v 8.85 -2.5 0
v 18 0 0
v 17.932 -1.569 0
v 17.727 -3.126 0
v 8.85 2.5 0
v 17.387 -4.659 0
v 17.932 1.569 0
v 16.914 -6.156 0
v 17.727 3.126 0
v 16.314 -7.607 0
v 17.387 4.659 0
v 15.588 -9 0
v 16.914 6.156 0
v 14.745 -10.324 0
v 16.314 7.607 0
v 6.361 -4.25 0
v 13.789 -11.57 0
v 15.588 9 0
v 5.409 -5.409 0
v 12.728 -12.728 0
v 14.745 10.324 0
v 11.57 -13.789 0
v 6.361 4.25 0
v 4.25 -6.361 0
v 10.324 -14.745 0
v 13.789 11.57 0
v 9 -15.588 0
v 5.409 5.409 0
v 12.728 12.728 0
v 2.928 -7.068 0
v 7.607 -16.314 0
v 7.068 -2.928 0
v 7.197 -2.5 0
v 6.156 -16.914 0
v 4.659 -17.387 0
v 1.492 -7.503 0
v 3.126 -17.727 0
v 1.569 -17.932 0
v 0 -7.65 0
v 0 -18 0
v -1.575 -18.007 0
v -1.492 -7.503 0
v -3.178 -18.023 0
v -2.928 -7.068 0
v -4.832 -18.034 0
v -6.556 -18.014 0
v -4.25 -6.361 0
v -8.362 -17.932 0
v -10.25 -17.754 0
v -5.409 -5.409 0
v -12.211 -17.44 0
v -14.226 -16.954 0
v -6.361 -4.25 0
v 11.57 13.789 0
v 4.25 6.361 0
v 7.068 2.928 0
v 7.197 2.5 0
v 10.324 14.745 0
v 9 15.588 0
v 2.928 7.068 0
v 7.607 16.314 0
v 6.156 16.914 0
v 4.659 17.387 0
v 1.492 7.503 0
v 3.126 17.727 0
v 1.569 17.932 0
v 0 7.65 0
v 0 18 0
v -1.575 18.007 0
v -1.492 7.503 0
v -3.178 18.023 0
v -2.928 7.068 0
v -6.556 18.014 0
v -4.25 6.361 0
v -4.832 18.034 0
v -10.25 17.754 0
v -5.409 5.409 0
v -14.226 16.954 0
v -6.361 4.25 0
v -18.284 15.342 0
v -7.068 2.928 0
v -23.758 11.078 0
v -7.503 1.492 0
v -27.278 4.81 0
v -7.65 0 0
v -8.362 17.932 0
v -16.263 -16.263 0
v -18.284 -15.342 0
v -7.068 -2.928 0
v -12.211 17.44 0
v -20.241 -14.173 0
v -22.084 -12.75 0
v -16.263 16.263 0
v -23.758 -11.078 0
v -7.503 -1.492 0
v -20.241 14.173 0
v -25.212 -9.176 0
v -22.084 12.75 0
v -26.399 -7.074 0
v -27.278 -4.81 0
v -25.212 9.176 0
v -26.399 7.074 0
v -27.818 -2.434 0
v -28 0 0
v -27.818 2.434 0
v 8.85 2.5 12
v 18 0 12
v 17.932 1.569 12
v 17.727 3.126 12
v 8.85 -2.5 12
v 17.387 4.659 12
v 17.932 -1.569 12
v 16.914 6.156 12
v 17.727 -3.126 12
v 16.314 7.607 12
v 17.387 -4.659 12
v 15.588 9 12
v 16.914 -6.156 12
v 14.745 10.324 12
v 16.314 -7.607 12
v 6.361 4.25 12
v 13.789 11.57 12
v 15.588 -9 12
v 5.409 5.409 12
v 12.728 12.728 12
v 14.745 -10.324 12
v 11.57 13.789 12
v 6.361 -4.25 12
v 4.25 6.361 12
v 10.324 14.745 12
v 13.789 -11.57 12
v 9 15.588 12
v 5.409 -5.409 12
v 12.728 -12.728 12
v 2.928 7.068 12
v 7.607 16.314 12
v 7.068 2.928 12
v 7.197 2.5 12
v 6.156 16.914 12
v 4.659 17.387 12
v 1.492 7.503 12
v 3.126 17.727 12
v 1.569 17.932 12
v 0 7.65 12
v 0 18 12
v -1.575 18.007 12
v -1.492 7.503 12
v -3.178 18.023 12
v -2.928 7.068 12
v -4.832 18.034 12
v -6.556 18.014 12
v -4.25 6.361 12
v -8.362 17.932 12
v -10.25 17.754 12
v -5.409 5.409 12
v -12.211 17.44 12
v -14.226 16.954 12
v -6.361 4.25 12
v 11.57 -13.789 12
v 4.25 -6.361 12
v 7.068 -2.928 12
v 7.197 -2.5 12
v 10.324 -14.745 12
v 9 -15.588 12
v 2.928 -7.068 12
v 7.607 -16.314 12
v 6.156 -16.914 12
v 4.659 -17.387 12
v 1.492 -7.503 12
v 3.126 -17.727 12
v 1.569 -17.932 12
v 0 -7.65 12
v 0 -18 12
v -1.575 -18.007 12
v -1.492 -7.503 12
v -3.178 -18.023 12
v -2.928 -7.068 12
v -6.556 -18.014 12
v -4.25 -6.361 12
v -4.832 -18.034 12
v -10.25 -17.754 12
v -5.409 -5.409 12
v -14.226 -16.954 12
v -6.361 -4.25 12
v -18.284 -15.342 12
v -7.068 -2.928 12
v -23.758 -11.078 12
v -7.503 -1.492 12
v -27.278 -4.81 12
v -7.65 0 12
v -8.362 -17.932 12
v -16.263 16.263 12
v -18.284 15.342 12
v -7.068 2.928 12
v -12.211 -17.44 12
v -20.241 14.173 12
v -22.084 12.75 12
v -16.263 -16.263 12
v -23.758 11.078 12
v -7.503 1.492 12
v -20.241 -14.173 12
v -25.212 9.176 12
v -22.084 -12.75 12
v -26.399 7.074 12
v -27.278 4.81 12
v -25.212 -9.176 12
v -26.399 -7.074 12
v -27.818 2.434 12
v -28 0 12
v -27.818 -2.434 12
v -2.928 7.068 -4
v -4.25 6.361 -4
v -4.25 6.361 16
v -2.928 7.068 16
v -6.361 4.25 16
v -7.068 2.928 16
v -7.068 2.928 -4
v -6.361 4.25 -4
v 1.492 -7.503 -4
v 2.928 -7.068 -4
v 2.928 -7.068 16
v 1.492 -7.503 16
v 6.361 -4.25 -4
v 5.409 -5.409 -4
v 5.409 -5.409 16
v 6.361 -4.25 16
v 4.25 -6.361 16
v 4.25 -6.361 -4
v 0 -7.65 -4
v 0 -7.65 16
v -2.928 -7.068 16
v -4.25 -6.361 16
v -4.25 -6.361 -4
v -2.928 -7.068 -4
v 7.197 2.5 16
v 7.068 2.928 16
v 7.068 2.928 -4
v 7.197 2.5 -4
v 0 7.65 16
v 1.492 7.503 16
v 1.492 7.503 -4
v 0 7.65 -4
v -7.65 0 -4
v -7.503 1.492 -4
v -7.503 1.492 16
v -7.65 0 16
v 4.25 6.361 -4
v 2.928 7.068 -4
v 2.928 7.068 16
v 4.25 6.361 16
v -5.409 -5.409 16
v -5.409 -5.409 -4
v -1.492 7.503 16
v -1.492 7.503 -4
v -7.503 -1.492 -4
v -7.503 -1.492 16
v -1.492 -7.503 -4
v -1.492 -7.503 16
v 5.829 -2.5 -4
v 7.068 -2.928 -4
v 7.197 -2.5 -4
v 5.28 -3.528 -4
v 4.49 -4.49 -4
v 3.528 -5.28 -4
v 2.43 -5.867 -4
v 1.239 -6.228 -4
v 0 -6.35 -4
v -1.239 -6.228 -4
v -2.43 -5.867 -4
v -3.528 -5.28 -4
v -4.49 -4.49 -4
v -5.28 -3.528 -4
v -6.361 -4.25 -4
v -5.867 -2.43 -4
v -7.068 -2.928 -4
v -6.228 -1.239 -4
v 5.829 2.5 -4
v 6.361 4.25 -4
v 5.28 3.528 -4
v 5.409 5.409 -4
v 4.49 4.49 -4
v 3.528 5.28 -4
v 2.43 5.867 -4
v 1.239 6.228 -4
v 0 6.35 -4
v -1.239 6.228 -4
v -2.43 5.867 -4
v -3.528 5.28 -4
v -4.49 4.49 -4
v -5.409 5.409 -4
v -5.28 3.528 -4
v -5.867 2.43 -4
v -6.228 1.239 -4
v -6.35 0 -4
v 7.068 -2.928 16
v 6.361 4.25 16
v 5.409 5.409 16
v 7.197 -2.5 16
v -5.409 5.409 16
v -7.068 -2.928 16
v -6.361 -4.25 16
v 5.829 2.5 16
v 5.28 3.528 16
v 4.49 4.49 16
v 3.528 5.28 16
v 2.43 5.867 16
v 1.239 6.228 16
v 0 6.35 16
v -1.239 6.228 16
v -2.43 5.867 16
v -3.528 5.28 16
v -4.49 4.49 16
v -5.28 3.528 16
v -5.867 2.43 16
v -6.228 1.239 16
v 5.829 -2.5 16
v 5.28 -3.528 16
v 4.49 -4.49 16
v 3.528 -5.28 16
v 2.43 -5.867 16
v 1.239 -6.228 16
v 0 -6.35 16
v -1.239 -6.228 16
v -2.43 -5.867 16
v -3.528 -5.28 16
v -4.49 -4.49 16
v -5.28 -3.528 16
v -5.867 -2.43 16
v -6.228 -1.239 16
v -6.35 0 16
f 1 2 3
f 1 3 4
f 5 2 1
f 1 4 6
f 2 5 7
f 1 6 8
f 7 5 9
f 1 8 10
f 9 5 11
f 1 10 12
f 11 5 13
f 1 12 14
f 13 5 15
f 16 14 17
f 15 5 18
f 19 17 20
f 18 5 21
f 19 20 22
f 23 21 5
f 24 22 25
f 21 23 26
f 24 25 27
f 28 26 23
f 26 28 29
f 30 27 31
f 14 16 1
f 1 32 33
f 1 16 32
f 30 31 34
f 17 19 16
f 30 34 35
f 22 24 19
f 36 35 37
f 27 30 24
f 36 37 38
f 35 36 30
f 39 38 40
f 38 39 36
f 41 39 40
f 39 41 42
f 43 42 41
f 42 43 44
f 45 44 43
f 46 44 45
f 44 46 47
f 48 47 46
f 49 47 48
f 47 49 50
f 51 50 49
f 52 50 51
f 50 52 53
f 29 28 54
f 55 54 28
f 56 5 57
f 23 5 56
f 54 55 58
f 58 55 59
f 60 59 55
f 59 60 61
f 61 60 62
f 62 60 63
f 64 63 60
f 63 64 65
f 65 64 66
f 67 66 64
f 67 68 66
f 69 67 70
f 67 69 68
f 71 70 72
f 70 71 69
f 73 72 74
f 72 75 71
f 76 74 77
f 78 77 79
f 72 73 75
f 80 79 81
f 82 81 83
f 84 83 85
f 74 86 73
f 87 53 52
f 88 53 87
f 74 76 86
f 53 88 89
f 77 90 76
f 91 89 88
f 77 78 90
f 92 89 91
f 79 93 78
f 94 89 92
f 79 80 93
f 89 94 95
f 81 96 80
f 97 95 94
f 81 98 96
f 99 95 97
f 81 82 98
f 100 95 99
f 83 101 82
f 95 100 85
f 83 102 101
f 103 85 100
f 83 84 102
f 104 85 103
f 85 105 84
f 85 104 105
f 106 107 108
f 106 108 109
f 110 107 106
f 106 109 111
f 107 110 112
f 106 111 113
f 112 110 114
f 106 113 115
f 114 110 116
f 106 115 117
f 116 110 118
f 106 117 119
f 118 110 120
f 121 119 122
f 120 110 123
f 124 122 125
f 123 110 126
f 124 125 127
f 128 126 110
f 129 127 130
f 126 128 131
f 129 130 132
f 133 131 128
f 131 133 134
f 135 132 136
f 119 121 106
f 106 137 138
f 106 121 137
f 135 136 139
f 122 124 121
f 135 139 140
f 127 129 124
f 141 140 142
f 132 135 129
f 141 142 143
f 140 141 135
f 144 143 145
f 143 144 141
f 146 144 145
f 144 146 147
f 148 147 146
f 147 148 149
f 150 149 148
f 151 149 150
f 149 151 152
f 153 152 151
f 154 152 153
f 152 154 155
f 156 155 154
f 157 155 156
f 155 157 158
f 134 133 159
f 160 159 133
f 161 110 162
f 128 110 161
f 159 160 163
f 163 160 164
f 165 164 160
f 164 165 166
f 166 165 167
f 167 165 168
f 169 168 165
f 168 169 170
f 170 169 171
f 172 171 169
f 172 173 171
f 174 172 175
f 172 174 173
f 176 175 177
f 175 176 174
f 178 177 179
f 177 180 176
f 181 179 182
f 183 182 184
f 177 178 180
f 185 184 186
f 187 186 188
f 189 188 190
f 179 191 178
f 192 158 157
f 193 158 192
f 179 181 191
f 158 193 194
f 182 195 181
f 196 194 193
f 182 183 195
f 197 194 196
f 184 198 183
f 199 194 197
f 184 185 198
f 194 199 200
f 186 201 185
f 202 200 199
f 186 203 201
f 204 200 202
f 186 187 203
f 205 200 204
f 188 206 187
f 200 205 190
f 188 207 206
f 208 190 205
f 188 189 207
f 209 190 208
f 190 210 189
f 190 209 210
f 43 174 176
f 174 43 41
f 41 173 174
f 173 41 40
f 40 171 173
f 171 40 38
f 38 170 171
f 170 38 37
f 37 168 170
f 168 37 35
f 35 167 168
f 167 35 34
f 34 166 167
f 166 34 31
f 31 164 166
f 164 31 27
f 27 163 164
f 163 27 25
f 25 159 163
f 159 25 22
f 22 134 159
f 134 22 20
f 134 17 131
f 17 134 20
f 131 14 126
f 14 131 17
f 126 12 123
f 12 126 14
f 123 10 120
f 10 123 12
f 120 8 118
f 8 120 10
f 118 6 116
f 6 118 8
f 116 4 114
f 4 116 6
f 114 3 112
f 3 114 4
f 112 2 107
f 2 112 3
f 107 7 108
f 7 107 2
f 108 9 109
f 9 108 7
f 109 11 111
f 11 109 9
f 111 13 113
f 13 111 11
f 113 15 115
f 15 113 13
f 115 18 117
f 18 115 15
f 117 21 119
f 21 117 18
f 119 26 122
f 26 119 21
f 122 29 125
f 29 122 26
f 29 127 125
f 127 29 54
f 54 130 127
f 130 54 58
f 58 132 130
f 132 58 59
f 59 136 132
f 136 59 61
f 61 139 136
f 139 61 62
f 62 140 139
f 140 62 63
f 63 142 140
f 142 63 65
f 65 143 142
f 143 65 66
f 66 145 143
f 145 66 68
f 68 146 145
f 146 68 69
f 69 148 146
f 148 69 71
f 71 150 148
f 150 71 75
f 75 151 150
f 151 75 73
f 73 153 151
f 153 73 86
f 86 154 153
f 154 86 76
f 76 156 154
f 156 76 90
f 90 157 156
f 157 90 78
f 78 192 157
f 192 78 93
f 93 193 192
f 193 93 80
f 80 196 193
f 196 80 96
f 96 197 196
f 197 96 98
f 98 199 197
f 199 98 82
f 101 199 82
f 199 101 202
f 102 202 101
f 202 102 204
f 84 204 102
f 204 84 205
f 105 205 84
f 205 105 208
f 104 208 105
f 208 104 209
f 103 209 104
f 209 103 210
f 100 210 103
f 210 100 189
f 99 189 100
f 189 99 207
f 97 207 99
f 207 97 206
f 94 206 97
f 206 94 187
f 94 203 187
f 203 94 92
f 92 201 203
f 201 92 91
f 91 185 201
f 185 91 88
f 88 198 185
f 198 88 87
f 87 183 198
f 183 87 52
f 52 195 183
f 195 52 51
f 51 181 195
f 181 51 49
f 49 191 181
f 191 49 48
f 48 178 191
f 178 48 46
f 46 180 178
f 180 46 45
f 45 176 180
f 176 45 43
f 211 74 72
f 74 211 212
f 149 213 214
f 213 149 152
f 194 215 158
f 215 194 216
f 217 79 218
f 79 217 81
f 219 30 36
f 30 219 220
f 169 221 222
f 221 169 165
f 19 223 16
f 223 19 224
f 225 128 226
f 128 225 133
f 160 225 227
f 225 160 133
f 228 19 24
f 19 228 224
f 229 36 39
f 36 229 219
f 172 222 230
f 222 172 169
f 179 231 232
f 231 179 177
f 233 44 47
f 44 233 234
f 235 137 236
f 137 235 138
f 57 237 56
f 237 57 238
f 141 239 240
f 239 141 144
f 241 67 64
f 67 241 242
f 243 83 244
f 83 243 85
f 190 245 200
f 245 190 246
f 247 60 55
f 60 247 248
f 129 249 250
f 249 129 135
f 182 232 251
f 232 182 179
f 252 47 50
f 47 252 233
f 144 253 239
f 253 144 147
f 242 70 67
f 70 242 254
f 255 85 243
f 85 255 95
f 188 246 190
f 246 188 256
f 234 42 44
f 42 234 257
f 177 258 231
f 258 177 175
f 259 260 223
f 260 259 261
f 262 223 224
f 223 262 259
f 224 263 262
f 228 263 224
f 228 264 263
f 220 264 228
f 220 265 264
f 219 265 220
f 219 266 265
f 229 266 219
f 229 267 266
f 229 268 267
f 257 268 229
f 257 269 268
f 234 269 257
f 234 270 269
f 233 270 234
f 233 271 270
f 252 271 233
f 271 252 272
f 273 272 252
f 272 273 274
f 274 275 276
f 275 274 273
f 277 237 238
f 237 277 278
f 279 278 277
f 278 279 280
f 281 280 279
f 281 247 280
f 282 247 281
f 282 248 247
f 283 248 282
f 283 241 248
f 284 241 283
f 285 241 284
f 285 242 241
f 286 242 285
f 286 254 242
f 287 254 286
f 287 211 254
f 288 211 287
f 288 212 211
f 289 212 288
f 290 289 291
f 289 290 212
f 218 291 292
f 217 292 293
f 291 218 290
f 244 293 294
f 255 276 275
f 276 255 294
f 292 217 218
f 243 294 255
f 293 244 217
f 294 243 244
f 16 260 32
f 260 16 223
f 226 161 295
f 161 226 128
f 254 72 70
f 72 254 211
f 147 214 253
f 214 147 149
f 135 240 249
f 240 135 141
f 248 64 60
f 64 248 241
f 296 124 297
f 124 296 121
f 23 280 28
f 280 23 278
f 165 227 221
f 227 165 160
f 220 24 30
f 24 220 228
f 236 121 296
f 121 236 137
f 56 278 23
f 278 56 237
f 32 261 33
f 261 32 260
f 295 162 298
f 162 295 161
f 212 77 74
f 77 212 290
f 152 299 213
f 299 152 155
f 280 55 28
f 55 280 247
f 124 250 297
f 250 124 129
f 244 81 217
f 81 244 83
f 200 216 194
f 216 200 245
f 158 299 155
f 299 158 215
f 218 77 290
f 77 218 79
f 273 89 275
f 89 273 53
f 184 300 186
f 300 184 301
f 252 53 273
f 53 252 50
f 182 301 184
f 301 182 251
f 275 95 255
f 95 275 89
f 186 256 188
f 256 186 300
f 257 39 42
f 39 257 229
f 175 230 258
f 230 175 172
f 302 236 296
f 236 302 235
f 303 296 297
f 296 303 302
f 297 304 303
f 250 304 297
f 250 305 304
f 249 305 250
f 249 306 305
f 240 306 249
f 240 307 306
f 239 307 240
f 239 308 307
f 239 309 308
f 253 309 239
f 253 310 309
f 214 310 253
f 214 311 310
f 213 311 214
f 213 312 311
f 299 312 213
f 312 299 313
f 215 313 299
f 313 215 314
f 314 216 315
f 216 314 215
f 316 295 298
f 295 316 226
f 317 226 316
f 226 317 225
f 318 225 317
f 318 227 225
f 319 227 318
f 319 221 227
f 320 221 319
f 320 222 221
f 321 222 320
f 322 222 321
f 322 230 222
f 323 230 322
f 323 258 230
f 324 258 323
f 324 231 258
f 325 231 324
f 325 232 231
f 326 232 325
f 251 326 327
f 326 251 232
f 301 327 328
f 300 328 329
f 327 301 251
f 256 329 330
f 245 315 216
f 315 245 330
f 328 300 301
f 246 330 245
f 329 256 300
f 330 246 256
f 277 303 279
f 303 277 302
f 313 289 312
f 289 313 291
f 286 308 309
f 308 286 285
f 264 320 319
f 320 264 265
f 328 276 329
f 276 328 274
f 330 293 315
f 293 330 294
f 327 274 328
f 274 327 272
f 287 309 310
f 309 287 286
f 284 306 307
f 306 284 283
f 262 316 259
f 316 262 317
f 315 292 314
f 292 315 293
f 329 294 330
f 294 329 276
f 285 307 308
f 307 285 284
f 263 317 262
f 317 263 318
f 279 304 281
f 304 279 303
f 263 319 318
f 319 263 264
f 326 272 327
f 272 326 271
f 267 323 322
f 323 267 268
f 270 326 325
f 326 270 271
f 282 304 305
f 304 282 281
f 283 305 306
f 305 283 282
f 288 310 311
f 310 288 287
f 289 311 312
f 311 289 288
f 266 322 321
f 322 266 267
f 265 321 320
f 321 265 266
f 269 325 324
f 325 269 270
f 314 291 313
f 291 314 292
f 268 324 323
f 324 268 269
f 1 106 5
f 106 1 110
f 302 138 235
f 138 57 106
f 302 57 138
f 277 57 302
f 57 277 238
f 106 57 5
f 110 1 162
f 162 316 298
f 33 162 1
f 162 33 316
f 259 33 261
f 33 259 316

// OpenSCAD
$fn = 32;

// ----------------------------------------------------------------------
// Cam: base radius 18 mm with a 10 mm lift over 180 degrees
// ----------------------------------------------------------------------

// --- parameters (mm) ---
base_r = 18;              // base radius
lift = 10;                // lift height above the base radius
lift_span = 180;          // angular width of the lift
lift_start = 90;          // angle where the lift starts
cam_t = 12;               // cam plate thickness
hub_d = 15.3;             // hub diameter
hub_h = 20;               // hub height
bore_d = 12.7;            // bore
key_w = 5;                // keyway width
key_depth = 1.6;          // keyway depth

cam_profile = [[18, 0], [17.932, 1.569], [17.727, 3.126], [17.387, 4.659], [16.914, 6.156], [16.314, 7.607], [15.588, 9], [14.745, 10.324], [13.789, 11.57], [12.728, 12.728], [11.57, 13.789], [10.324, 14.745], [9, 15.588], [7.607, 16.314], [6.156, 16.914], [4.659, 17.387], [3.126, 17.727], [1.569, 17.932], [0, 18], [-1.575, 18.007], [-3.178, 18.023], [-4.832, 18.034], [-6.556, 18.014], [-8.362, 17.932], [-10.25, 17.754], [-12.211, 17.44], [-14.226, 16.954], [-16.263, 16.263], [-18.284, 15.342], [-20.241, 14.173], [-22.084, 12.75], [-23.758, 11.078], [-25.212, 9.176], [-26.399, 7.074], [-27.278, 4.81], [-27.818, 2.434], [-28, 0], [-27.818, -2.434], [-27.278, -4.81], [-26.399, -7.074], [-25.212, -9.176], [-23.758, -11.078], [-22.084, -12.75], [-20.241, -14.173], [-18.284, -15.342], [-16.263, -16.263], [-14.226, -16.954], [-12.211, -17.44], [-10.25, -17.754], [-8.362, -17.932], [-6.556, -18.014], [-4.832, -18.034], [-3.178, -18.023], [-1.575, -18.007], [0, -18], [1.569, -17.932], [3.126, -17.727], [4.659, -17.387], [6.156, -16.914], [7.607, -16.314], [9, -15.588], [10.324, -14.745], [11.57, -13.789], [12.728, -12.728], [13.789, -11.57], [14.745, -10.324], [15.588, -9], [16.314, -7.607], [16.914, -6.156], [17.387, -4.659], [17.727, -3.126], [17.932, -1.569]];

difference() {
  union() {
    linear_extrude(height = cam_t) polygon(cam_profile);
    /* hub, proud of the cam plate on both sides */
    translate([0, 0, -4]) cylinder(h = hub_h, d = hub_d);
  }
  /* bore through the hub, 2.5 mm clear on both faces */
  translate([0, 0, -6.5]) cylinder(h = hub_h + 5, d = bore_d);
  /* keyway, milled through the whole hub */
  translate([4.75, -2.5, -6.5]) cube([4.1, 5, 25]);
}
